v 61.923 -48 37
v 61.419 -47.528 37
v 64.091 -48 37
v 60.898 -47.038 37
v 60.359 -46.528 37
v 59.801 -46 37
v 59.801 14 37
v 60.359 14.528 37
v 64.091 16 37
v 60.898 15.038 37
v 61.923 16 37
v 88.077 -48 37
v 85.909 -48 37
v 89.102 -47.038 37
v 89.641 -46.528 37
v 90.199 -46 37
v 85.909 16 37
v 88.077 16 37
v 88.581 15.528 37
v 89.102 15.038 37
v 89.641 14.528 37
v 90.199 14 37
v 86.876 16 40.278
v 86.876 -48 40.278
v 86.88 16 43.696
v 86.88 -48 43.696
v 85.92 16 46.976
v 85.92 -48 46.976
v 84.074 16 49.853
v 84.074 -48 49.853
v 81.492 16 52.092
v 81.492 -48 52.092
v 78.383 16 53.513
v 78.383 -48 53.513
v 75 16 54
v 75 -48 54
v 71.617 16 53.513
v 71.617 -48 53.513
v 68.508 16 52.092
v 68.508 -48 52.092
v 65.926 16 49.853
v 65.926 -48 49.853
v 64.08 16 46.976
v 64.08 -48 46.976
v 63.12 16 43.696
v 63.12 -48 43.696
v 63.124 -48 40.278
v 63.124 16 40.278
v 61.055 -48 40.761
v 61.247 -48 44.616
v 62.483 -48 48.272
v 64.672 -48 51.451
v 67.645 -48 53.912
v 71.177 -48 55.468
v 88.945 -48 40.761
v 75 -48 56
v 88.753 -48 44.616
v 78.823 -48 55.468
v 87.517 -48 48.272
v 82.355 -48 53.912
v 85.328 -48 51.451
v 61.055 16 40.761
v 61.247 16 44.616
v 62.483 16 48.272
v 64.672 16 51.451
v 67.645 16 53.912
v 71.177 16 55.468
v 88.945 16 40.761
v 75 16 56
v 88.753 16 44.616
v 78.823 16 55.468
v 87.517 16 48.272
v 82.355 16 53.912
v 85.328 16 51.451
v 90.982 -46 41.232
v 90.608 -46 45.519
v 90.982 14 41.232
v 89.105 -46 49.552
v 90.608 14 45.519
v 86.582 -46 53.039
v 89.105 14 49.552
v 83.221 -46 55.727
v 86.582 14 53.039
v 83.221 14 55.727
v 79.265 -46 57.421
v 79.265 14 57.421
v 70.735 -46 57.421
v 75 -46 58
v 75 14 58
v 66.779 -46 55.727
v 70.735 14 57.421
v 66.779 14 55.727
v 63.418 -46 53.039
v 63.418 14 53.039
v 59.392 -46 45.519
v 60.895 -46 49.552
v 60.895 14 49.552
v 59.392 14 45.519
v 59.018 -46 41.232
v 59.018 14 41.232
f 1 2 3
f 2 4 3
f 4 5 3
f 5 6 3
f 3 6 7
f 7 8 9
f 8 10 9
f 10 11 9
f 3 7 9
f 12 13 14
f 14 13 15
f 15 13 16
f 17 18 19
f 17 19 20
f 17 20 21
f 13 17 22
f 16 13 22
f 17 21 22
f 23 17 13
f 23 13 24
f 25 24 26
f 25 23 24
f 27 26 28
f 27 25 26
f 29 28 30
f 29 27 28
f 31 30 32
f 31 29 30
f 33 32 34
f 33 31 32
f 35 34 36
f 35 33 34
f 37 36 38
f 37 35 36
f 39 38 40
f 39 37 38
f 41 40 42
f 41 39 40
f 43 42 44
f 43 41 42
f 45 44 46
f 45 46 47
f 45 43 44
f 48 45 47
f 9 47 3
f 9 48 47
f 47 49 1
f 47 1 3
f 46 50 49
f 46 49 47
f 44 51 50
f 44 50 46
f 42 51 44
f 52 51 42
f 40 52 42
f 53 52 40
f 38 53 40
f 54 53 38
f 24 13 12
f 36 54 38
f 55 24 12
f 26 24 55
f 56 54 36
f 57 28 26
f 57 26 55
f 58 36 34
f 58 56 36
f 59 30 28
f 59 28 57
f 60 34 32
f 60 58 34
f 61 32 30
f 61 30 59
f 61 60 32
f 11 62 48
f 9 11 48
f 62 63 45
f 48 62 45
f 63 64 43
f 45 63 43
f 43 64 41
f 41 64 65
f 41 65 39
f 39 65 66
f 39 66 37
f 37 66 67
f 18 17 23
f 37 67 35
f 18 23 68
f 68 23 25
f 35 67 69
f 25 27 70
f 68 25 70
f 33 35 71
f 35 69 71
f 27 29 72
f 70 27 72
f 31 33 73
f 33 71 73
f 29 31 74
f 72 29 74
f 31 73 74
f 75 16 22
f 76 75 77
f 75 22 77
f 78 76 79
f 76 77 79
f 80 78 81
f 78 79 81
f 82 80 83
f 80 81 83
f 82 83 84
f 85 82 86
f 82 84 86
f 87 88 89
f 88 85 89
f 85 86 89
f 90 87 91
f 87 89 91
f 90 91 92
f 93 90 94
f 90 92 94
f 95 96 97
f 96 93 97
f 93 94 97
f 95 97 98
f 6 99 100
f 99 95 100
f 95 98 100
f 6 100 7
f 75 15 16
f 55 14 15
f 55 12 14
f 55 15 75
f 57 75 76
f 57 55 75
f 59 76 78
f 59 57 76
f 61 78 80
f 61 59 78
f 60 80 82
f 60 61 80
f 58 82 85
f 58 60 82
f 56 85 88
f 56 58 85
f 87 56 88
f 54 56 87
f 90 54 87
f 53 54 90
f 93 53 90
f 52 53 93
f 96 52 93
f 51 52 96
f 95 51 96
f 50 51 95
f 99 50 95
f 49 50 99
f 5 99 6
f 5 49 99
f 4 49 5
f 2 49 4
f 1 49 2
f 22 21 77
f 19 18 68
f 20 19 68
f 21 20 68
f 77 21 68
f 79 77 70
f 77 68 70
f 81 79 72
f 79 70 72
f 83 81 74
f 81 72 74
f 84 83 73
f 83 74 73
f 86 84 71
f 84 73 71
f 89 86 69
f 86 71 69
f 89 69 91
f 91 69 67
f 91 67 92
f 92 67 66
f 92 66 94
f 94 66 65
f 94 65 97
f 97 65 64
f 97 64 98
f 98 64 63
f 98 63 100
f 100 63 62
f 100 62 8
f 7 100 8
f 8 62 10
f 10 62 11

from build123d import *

# Parameters (mm, degrees)
BOX_W           = 100
BOX_H           = 100
BOX_DEPTH       = 100
TUBE001_R       = 16
TUBE001_R_2     = 12
TUBE001_DEPTH   = 64
CHAMFER003_SIZE = 2


with BuildPart() as krychle:
    # Box → Box (new body)
    with BuildSketch(Plane(origin=(32, -54, -63), x_dir=(1, 0, 0), z_dir=(0, 0, 1))):
        with Locations((50, 50)):
            Rectangle(BOX_W, BOX_H)
    extrude(amount=BOX_DEPTH)


with BuildPart() as cut381:
    # Tube001 → Tube001 (new body)
    with BuildSketch(Plane(origin=(75, 16, 42), x_dir=(1, 0, 0), z_dir=(0, -1, 0))):
        Circle(TUBE001_R)
        Circle(TUBE001_R_2, mode=Mode.SUBTRACT)
    extrude(amount=TUBE001_DEPTH)

    # Chamfer003
    chamfer003_edges = [cut381.edges().sort_by_distance(p)[0] for p in [
        (59, -48, 42),
        (59, 16, 42),
    ]]
    chamfer(chamfer003_edges, length=CHAMFER003_SIZE)

    # Cut381: cut Krychle
    add(krychle.part, mode=Mode.SUBTRACT)


solid = cut381.part
